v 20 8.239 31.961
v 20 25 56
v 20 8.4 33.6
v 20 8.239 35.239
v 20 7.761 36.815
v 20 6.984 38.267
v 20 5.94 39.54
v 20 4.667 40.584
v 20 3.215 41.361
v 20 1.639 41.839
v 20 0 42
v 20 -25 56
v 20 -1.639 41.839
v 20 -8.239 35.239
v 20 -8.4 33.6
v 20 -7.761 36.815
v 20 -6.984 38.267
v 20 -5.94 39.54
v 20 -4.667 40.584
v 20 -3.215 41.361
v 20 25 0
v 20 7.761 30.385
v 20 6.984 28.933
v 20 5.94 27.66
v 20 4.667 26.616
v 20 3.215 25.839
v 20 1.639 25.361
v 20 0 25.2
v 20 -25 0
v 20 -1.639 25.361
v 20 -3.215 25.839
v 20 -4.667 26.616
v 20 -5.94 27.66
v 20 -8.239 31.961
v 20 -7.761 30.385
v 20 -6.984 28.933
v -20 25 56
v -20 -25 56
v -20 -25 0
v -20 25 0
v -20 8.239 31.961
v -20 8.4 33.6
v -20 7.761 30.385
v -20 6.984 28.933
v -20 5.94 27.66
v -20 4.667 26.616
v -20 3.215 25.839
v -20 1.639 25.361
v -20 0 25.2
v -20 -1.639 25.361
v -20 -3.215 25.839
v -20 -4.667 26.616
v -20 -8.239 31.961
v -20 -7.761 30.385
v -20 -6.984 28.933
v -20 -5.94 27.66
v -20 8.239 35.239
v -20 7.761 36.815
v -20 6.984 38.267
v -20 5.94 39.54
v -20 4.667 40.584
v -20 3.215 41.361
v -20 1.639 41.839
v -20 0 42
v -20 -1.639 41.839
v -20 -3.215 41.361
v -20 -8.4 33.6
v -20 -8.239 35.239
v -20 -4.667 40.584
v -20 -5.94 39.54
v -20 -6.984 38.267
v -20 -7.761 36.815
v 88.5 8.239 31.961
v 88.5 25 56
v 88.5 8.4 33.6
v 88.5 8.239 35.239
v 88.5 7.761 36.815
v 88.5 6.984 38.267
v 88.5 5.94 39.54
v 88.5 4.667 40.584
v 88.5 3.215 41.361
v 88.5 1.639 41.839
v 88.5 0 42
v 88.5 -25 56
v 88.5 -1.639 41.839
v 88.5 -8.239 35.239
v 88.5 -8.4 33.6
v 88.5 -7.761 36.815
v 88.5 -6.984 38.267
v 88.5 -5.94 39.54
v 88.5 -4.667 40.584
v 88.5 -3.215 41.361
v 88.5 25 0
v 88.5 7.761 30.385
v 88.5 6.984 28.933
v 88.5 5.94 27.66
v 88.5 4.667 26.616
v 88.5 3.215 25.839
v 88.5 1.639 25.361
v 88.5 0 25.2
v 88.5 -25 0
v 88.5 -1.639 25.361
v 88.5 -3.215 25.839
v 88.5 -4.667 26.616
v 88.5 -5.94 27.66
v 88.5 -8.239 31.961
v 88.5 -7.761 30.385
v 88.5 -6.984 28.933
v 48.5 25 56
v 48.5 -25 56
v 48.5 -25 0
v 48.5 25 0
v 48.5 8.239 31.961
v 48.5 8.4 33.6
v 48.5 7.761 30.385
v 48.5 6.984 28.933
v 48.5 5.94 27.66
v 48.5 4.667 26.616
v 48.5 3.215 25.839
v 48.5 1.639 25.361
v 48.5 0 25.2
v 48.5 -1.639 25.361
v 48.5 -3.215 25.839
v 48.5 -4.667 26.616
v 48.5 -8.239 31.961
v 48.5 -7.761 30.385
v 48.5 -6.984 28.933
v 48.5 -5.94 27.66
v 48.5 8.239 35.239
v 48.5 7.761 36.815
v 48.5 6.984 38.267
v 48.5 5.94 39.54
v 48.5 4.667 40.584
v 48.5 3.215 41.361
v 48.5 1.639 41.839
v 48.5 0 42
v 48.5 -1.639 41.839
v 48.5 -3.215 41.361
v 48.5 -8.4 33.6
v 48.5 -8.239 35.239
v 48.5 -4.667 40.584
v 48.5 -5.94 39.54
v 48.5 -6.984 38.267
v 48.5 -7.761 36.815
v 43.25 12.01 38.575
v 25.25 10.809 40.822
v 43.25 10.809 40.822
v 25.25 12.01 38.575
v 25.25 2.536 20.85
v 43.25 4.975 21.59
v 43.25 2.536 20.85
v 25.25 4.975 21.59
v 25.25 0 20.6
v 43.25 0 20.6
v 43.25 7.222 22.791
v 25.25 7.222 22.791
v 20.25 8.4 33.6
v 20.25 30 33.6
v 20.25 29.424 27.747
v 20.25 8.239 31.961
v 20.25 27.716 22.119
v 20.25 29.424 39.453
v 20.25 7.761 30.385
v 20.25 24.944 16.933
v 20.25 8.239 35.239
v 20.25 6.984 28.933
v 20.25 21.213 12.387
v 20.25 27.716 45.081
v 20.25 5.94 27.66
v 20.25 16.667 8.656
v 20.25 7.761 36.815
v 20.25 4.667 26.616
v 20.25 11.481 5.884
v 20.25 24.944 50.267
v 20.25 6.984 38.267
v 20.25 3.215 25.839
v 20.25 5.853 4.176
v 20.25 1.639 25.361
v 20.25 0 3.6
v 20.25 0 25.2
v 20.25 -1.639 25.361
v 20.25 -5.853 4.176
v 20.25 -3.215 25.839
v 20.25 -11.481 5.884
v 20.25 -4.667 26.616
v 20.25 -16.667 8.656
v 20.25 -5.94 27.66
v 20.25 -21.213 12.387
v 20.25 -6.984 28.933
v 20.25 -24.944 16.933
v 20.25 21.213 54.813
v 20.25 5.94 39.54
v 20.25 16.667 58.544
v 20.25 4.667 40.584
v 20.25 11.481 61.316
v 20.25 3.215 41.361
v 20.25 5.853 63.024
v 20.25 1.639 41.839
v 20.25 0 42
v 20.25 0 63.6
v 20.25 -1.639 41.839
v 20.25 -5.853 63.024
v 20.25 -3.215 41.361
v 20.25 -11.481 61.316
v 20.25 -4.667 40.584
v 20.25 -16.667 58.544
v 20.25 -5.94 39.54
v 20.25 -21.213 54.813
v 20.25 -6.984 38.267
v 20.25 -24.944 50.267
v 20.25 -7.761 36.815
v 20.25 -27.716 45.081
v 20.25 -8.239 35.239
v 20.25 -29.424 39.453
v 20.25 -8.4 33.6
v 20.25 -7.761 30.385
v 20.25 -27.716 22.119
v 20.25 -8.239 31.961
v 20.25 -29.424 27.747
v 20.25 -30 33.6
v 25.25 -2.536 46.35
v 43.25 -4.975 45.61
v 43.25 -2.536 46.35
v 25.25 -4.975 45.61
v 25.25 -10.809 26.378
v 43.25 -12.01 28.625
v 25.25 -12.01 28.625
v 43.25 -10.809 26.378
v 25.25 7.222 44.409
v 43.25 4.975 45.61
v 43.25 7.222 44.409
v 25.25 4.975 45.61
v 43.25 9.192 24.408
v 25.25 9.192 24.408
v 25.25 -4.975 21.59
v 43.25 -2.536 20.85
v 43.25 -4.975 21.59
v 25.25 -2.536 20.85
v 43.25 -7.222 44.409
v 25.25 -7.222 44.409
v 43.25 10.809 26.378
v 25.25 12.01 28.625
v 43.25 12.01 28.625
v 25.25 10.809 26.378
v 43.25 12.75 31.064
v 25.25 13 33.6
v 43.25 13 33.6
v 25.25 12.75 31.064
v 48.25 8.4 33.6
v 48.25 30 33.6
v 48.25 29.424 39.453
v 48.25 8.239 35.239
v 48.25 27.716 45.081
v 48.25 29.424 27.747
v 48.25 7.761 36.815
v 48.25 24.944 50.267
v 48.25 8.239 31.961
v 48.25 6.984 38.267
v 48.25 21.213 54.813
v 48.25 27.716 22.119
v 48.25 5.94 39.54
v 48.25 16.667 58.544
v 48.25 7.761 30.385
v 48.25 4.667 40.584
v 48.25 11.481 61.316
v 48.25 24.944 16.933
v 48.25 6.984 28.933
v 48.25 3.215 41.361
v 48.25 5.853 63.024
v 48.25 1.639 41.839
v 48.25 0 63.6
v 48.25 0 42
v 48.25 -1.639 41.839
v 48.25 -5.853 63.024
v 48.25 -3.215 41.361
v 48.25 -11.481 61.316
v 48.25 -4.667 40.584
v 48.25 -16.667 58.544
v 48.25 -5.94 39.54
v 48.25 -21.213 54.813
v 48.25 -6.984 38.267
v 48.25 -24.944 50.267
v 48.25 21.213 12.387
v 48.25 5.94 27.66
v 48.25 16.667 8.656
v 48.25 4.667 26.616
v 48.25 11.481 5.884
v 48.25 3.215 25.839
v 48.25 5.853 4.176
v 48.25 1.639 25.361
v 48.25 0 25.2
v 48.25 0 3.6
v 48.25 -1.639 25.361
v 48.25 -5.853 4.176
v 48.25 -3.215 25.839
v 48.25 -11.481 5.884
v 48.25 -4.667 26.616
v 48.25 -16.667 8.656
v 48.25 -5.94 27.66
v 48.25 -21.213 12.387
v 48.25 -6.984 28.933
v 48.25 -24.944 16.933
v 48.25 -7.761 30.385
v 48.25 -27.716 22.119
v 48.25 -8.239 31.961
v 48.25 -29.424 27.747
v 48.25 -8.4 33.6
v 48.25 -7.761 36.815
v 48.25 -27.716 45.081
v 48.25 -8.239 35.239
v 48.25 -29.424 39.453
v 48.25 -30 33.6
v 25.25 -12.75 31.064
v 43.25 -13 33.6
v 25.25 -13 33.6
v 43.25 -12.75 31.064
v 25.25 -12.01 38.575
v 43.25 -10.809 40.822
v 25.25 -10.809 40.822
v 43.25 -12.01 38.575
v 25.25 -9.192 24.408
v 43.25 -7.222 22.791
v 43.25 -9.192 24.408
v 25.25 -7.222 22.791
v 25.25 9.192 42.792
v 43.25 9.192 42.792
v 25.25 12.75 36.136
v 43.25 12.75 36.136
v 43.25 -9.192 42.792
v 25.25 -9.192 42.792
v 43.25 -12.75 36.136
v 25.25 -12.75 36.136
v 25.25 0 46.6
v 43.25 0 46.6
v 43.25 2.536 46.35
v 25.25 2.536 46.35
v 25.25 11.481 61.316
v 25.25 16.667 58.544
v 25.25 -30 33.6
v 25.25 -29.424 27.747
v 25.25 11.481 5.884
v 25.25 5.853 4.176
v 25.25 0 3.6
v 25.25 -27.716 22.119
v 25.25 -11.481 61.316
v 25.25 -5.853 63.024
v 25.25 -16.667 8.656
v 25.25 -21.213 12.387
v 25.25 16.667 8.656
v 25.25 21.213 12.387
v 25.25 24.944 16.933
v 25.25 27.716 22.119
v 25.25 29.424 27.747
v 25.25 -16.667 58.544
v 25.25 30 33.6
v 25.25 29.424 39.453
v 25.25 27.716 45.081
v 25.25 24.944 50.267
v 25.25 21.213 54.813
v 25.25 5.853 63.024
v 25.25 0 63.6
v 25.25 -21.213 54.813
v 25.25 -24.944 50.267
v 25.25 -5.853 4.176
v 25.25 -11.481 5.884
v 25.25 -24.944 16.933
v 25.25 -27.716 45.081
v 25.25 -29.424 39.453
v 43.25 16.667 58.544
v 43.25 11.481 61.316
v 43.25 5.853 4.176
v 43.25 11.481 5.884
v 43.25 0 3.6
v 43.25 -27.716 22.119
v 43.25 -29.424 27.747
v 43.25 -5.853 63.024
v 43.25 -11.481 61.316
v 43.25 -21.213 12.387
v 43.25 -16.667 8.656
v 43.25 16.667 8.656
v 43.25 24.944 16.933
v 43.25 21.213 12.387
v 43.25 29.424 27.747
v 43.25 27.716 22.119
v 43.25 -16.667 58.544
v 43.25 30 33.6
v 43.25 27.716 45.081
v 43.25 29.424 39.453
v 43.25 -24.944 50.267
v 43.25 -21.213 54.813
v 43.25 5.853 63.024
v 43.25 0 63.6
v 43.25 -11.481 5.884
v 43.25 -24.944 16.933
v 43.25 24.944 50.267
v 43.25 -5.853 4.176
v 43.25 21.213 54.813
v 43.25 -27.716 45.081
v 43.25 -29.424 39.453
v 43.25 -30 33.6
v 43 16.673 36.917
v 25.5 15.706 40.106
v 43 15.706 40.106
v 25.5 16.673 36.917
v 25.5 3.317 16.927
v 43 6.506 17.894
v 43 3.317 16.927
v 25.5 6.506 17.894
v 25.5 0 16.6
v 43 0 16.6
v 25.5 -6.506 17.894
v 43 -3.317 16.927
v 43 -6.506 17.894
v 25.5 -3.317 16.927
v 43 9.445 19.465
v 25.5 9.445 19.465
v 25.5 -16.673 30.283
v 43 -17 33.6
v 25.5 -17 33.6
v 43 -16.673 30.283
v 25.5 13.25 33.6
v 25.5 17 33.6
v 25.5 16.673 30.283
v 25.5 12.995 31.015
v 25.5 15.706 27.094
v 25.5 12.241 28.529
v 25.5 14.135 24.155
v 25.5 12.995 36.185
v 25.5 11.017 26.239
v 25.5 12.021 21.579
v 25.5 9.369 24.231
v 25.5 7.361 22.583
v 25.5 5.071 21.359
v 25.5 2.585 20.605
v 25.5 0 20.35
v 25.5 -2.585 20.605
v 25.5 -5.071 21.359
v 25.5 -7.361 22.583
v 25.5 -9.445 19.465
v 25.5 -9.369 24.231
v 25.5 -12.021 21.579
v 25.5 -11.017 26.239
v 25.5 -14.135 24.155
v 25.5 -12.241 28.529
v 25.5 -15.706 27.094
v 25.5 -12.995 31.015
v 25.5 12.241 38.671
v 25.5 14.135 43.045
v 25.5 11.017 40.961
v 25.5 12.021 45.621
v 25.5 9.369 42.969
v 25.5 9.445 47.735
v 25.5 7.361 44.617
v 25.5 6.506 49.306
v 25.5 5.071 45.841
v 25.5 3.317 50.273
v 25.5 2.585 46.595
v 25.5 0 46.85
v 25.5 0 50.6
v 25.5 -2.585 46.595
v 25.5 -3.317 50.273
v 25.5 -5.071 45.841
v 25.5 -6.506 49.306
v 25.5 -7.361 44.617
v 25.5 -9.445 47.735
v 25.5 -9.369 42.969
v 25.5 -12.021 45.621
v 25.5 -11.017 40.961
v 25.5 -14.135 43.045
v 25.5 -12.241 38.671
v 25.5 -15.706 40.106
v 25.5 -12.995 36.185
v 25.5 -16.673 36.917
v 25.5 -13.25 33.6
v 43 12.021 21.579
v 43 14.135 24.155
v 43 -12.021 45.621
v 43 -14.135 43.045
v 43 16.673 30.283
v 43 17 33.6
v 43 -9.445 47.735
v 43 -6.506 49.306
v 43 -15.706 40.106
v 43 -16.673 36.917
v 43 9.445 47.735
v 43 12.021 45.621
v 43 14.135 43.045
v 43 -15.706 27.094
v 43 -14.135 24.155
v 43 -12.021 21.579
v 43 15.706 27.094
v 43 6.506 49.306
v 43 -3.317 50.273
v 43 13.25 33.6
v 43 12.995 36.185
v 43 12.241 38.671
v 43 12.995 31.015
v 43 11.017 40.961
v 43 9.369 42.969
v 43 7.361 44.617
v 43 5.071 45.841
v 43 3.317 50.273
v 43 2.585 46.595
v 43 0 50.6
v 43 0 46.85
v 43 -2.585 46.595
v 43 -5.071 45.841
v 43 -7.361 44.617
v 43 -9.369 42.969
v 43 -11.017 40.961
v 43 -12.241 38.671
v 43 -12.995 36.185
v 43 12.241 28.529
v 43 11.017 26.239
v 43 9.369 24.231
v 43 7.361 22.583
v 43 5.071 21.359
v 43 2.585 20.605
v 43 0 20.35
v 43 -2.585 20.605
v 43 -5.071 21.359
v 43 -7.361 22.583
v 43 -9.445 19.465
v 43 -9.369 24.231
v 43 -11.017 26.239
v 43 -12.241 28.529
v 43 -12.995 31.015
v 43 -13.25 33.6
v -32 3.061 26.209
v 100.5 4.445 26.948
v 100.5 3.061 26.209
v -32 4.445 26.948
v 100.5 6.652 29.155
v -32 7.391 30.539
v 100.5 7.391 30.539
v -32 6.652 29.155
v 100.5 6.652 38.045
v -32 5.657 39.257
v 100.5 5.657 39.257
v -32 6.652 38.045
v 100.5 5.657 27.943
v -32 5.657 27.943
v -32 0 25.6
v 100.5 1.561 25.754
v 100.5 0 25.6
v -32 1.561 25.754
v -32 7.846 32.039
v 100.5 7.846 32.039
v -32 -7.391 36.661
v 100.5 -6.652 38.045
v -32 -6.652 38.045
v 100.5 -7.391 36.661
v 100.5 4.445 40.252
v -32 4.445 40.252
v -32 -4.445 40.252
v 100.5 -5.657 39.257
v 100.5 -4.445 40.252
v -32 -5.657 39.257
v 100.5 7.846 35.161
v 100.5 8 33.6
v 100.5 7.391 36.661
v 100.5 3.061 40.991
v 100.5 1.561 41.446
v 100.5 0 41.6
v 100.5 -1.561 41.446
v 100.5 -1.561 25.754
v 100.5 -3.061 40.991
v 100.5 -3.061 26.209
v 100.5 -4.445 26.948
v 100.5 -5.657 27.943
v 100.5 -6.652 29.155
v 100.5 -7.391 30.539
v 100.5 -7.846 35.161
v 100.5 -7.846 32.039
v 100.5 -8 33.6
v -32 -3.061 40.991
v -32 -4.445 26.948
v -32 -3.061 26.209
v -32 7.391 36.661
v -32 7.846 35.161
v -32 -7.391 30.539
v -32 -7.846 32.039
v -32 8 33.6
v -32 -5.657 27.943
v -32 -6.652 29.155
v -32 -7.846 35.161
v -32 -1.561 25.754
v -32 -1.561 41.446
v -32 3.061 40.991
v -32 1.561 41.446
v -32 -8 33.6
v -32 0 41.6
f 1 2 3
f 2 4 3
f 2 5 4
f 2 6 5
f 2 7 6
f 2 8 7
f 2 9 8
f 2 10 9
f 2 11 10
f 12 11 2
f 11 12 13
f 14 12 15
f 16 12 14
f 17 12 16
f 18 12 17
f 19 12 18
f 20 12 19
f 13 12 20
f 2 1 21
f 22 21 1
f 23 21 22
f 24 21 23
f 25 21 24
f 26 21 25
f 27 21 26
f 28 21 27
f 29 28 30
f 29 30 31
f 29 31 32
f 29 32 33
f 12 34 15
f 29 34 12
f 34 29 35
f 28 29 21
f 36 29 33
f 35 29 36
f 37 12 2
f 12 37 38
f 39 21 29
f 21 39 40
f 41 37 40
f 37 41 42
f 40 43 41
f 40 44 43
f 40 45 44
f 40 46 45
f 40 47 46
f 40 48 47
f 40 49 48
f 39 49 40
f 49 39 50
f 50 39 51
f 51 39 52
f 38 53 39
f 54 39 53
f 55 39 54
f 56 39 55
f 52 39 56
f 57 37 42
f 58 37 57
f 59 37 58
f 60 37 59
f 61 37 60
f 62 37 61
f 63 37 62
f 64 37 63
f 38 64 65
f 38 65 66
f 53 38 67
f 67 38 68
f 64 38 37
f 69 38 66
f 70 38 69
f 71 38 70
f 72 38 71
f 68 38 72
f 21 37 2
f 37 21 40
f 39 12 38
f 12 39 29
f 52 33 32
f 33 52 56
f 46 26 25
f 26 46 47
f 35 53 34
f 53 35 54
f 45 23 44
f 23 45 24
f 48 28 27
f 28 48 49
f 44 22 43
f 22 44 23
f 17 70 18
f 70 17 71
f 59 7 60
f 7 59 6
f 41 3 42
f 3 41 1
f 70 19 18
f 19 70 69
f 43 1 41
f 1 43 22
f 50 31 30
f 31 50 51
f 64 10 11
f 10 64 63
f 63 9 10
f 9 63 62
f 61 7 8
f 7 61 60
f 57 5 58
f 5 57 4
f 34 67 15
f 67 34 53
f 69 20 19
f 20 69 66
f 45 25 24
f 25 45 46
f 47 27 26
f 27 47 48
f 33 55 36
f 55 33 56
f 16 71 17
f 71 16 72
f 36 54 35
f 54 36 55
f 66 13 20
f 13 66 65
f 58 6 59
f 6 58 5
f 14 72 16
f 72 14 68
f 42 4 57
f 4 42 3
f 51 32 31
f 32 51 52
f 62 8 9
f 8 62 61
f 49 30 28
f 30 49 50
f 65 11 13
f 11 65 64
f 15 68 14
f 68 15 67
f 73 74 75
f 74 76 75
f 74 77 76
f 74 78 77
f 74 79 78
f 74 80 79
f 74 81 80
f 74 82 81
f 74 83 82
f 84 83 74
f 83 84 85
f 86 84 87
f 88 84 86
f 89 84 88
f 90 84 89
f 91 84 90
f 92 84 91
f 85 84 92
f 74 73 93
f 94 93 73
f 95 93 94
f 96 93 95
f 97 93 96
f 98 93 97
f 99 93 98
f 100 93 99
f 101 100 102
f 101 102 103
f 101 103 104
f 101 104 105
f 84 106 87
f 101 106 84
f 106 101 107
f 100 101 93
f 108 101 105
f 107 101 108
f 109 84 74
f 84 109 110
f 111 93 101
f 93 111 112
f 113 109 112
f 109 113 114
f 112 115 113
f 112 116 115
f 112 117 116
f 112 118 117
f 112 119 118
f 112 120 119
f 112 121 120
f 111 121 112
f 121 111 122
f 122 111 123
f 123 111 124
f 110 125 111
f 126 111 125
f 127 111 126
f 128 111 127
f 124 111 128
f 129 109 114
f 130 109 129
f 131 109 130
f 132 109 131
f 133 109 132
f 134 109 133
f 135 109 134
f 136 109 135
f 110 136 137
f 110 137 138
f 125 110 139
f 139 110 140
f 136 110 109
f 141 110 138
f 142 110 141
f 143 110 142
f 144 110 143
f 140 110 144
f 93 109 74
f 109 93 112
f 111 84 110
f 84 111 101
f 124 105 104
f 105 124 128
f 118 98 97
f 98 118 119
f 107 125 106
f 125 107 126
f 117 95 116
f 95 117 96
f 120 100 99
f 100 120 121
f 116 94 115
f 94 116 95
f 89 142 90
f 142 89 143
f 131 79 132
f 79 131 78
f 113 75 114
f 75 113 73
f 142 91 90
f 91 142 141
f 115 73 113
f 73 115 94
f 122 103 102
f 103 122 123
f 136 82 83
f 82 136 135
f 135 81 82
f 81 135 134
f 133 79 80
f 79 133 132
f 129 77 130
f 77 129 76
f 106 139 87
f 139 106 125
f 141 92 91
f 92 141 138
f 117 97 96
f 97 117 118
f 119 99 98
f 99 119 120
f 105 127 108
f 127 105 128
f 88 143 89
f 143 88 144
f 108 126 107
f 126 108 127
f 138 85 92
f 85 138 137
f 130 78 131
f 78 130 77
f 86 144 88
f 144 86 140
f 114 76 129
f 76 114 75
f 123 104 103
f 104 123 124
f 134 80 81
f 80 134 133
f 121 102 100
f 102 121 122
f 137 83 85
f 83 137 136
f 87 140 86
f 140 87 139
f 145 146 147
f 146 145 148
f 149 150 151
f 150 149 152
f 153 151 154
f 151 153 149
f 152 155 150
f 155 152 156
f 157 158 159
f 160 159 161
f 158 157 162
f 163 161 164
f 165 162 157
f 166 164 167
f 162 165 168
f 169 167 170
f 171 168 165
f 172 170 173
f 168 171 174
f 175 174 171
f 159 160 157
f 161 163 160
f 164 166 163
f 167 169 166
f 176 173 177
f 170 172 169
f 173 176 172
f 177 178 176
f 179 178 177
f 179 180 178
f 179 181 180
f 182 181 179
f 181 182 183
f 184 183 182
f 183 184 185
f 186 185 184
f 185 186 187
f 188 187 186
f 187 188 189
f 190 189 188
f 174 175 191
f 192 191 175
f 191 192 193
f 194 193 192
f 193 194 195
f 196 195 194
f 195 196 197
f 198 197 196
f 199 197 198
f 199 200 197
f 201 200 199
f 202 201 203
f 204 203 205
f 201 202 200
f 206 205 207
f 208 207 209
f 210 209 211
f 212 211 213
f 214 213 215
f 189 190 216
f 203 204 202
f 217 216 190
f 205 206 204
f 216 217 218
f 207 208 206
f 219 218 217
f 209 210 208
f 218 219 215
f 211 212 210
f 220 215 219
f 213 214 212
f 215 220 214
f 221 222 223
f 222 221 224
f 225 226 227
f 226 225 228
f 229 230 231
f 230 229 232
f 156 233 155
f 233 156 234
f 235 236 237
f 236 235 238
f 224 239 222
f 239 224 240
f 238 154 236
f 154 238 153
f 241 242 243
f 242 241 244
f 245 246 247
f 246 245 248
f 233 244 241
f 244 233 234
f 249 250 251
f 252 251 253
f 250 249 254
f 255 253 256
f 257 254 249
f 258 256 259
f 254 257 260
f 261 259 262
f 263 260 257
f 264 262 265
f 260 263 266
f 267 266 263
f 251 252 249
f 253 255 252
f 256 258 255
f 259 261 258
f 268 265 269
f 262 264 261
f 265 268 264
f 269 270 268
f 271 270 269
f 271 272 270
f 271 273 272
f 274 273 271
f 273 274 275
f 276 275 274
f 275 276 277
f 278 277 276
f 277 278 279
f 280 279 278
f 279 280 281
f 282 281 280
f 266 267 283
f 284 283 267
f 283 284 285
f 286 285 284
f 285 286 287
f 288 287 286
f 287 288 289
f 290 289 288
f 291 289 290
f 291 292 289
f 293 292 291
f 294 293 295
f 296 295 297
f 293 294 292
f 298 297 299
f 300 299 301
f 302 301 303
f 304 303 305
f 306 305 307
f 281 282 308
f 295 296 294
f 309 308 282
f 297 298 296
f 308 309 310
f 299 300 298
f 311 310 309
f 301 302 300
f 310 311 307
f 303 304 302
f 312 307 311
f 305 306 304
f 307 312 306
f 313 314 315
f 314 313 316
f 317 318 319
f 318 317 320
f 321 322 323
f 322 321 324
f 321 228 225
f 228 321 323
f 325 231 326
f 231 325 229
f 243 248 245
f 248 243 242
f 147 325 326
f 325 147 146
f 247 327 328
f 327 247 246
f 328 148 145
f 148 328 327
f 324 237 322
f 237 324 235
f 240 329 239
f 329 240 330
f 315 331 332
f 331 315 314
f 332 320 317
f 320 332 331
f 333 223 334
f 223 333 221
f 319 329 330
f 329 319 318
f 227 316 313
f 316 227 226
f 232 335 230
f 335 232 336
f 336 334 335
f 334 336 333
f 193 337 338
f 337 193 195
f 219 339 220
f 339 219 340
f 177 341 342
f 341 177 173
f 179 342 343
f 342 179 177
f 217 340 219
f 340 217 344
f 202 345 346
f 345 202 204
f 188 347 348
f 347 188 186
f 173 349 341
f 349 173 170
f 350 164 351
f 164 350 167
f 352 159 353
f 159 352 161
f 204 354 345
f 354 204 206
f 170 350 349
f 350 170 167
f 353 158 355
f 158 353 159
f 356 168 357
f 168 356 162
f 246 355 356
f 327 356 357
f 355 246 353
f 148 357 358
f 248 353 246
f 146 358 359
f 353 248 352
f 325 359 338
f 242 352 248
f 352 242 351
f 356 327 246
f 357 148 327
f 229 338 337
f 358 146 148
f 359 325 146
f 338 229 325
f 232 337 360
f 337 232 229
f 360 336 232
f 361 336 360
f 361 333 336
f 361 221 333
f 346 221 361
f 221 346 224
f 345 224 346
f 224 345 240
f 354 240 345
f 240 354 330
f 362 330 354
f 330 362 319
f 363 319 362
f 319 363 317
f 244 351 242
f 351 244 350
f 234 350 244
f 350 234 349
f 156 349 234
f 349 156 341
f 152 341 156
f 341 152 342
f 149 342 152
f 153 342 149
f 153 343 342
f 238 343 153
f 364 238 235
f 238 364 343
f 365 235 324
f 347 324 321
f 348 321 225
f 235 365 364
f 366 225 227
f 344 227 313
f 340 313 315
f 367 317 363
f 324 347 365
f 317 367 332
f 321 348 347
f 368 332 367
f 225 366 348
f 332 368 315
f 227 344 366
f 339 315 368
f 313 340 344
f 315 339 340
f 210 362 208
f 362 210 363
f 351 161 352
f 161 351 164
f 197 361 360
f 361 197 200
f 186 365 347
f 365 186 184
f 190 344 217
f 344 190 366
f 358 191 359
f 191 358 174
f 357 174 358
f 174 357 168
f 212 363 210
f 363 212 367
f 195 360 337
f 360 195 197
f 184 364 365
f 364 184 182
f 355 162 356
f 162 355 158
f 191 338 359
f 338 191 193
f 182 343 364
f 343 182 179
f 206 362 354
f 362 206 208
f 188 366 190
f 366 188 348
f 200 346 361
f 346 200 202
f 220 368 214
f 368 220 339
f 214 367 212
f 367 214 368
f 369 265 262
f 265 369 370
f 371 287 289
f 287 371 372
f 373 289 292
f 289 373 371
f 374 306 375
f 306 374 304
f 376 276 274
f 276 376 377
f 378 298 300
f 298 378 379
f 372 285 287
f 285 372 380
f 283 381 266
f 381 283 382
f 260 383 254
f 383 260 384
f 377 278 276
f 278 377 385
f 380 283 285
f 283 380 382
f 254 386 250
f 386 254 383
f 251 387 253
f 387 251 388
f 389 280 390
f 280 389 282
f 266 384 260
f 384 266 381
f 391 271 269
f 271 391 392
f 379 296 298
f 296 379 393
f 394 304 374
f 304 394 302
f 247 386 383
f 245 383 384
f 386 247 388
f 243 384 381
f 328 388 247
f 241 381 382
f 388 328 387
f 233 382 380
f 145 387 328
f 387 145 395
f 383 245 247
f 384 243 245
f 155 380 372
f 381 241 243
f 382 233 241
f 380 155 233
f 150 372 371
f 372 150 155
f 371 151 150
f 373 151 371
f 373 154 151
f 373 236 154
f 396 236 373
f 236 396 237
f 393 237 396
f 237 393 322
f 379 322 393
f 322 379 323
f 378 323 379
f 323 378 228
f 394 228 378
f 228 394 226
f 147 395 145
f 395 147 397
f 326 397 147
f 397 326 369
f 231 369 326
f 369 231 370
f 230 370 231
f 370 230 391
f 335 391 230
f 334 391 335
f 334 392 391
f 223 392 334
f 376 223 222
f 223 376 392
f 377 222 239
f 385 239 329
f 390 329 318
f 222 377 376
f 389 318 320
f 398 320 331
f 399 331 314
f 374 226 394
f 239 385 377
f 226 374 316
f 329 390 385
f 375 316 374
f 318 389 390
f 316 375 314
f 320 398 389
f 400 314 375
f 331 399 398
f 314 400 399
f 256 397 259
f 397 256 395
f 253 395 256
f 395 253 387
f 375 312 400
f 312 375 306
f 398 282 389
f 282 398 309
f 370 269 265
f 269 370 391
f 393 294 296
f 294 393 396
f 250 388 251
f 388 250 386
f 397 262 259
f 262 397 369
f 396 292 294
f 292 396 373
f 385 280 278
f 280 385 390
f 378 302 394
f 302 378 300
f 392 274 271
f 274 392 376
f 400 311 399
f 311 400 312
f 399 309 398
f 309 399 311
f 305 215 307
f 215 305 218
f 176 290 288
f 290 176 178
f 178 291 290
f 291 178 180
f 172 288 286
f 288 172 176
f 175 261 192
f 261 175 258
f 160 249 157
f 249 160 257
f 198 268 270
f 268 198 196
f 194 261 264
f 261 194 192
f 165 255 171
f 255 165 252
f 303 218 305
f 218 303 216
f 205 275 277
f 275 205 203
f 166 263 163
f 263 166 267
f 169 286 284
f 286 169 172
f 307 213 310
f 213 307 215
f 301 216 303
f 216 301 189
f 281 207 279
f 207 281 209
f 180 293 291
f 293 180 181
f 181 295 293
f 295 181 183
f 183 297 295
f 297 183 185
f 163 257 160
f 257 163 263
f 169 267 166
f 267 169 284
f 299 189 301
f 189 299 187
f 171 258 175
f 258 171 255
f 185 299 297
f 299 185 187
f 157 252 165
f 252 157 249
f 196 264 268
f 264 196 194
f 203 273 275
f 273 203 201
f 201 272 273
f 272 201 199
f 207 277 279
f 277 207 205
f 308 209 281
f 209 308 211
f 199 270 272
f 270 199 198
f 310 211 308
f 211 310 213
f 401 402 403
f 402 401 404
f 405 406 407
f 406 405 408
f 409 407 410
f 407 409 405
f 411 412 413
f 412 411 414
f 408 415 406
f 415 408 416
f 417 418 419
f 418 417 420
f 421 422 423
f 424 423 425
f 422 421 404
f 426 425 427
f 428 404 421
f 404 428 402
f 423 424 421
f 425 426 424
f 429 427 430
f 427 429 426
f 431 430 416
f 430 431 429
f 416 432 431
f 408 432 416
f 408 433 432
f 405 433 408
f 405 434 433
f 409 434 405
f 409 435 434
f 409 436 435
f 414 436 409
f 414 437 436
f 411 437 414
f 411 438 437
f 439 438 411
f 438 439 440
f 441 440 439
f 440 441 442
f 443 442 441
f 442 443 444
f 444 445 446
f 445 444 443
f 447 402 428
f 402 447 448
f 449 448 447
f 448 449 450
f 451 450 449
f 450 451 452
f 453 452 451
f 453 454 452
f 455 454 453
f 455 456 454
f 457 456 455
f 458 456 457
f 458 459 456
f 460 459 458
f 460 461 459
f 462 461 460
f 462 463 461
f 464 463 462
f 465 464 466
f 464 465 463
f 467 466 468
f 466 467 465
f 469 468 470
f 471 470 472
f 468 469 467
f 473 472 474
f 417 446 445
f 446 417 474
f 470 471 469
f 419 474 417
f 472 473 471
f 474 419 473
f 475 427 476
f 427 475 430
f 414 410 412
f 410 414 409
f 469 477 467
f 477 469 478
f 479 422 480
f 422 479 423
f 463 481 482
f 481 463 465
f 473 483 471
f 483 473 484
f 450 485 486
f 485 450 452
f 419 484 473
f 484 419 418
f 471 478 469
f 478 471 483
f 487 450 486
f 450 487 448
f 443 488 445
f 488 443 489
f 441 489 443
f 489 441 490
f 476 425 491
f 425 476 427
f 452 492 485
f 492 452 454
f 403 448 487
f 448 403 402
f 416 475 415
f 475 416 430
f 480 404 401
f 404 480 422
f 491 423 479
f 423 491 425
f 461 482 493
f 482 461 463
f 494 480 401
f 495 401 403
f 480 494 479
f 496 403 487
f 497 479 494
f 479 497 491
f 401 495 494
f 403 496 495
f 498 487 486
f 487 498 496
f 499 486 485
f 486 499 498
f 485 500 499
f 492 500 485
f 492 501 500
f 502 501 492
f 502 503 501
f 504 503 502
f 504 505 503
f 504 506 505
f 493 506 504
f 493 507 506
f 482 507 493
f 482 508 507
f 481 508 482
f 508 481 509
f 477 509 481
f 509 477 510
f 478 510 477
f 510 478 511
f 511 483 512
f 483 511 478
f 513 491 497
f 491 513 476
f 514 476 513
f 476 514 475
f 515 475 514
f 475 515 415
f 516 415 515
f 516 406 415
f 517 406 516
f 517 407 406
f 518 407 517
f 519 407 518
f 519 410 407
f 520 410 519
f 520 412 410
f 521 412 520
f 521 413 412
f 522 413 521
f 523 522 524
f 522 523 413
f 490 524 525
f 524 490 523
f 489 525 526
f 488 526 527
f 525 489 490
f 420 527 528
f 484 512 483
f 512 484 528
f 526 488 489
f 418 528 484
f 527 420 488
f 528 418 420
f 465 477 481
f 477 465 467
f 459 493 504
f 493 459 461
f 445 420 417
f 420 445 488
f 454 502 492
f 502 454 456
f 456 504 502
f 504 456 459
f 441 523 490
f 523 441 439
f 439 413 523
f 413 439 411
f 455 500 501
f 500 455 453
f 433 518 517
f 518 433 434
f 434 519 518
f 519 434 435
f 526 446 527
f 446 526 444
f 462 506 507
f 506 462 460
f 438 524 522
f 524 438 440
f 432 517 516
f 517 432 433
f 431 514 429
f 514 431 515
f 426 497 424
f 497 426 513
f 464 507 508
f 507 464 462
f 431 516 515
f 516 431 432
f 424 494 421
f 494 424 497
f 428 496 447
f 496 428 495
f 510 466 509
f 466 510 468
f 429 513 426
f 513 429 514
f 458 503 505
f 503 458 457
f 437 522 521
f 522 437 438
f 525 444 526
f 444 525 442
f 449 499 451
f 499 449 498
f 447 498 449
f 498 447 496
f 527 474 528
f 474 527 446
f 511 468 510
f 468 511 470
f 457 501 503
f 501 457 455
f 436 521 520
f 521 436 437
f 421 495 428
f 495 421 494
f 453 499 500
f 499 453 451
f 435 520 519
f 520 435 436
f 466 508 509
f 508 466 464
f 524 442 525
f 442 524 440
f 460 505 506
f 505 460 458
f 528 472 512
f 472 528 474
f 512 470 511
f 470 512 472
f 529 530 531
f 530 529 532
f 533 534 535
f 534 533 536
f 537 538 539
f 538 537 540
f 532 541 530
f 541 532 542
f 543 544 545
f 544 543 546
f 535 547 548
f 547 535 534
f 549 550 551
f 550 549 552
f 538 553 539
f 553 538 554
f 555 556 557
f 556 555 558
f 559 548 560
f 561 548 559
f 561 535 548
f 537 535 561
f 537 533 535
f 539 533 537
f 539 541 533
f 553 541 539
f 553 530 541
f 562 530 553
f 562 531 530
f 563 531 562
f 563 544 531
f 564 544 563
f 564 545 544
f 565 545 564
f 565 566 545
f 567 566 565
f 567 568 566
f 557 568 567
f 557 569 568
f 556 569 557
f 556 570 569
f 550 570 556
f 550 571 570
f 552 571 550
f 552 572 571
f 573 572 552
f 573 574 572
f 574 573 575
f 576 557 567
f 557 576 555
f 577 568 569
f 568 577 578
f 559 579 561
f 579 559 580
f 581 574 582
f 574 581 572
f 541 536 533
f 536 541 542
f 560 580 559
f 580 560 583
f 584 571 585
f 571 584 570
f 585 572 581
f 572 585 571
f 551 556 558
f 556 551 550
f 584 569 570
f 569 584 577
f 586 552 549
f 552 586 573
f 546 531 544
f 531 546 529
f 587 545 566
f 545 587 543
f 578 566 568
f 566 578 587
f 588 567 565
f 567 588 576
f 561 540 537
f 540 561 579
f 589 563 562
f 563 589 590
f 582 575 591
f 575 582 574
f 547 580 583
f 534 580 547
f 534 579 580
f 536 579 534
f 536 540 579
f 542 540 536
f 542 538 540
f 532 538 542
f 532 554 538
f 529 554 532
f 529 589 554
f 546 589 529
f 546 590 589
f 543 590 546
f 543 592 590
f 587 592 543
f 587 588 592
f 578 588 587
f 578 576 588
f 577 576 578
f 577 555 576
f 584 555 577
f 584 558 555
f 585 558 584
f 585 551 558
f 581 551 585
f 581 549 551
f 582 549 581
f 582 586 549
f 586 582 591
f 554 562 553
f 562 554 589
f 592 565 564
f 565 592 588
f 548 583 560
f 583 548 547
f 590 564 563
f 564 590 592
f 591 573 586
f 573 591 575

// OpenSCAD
$fn = 32;

// ------------------------------------------------------------------------
// Pulley assembly: d60 pulley with a belt, shaft d16
// Every part is its own module, assembly() places them once.
// ------------------------------------------------------------------------

// --- part 1 ---
module support1() {
  difference() {
    translate([-20, -25, 0]) cube([40, 50, 56]);
    translate([0, 0, 33.6]) rotate([0, 90, 0]) cylinder(h = 42, d = 16.8, center = true);
  }
}

// --- part 2 ---
module support2() {
  difference() {
    translate([-20, -25, 0]) cube([40, 50, 56]);
    translate([0, 0, 33.6]) rotate([0, 90, 0]) cylinder(h = 42, d = 16.8, center = true);
  }
}

// --- part 3 ---
module shaft() {
  translate([0, 0, -66.25]) cylinder(h = 132.5, d = 16);
}

// --- part 4 ---
module pulley() {
  difference() {
    union() {
      cylinder(h = 28, d = 26);
      cylinder(h = 5, d = 60);
      translate([0, 0, 23]) cylinder(h = 5, d = 60);
    }
    translate([0, 0, -1]) cylinder(h = 30, d = 16.8);
  }
}

// --- part 5 ---
module belt() {
  difference() {
      translate([0, 0, 0]) cylinder(h = 17.5, d = 34);
      translate([0, 0, -1]) cylinder(h = 19.5, d = 26.5);
    }
}

// --- assembly ---
module assembly() {
  translate([0, 0, 0]) rotate([0, 0, 0]) support1();
  translate([68.5, 0, 0]) rotate([0, 0, 0]) support2();
  translate([34.25, 0, 33.6]) rotate([0, 90, 0]) shaft();
  translate([20.25, 0, 33.6]) rotate([0, 90, 0]) pulley();
  translate([25.5, 0, 33.6]) rotate([0, 90, 0]) belt();
}

assembly();
